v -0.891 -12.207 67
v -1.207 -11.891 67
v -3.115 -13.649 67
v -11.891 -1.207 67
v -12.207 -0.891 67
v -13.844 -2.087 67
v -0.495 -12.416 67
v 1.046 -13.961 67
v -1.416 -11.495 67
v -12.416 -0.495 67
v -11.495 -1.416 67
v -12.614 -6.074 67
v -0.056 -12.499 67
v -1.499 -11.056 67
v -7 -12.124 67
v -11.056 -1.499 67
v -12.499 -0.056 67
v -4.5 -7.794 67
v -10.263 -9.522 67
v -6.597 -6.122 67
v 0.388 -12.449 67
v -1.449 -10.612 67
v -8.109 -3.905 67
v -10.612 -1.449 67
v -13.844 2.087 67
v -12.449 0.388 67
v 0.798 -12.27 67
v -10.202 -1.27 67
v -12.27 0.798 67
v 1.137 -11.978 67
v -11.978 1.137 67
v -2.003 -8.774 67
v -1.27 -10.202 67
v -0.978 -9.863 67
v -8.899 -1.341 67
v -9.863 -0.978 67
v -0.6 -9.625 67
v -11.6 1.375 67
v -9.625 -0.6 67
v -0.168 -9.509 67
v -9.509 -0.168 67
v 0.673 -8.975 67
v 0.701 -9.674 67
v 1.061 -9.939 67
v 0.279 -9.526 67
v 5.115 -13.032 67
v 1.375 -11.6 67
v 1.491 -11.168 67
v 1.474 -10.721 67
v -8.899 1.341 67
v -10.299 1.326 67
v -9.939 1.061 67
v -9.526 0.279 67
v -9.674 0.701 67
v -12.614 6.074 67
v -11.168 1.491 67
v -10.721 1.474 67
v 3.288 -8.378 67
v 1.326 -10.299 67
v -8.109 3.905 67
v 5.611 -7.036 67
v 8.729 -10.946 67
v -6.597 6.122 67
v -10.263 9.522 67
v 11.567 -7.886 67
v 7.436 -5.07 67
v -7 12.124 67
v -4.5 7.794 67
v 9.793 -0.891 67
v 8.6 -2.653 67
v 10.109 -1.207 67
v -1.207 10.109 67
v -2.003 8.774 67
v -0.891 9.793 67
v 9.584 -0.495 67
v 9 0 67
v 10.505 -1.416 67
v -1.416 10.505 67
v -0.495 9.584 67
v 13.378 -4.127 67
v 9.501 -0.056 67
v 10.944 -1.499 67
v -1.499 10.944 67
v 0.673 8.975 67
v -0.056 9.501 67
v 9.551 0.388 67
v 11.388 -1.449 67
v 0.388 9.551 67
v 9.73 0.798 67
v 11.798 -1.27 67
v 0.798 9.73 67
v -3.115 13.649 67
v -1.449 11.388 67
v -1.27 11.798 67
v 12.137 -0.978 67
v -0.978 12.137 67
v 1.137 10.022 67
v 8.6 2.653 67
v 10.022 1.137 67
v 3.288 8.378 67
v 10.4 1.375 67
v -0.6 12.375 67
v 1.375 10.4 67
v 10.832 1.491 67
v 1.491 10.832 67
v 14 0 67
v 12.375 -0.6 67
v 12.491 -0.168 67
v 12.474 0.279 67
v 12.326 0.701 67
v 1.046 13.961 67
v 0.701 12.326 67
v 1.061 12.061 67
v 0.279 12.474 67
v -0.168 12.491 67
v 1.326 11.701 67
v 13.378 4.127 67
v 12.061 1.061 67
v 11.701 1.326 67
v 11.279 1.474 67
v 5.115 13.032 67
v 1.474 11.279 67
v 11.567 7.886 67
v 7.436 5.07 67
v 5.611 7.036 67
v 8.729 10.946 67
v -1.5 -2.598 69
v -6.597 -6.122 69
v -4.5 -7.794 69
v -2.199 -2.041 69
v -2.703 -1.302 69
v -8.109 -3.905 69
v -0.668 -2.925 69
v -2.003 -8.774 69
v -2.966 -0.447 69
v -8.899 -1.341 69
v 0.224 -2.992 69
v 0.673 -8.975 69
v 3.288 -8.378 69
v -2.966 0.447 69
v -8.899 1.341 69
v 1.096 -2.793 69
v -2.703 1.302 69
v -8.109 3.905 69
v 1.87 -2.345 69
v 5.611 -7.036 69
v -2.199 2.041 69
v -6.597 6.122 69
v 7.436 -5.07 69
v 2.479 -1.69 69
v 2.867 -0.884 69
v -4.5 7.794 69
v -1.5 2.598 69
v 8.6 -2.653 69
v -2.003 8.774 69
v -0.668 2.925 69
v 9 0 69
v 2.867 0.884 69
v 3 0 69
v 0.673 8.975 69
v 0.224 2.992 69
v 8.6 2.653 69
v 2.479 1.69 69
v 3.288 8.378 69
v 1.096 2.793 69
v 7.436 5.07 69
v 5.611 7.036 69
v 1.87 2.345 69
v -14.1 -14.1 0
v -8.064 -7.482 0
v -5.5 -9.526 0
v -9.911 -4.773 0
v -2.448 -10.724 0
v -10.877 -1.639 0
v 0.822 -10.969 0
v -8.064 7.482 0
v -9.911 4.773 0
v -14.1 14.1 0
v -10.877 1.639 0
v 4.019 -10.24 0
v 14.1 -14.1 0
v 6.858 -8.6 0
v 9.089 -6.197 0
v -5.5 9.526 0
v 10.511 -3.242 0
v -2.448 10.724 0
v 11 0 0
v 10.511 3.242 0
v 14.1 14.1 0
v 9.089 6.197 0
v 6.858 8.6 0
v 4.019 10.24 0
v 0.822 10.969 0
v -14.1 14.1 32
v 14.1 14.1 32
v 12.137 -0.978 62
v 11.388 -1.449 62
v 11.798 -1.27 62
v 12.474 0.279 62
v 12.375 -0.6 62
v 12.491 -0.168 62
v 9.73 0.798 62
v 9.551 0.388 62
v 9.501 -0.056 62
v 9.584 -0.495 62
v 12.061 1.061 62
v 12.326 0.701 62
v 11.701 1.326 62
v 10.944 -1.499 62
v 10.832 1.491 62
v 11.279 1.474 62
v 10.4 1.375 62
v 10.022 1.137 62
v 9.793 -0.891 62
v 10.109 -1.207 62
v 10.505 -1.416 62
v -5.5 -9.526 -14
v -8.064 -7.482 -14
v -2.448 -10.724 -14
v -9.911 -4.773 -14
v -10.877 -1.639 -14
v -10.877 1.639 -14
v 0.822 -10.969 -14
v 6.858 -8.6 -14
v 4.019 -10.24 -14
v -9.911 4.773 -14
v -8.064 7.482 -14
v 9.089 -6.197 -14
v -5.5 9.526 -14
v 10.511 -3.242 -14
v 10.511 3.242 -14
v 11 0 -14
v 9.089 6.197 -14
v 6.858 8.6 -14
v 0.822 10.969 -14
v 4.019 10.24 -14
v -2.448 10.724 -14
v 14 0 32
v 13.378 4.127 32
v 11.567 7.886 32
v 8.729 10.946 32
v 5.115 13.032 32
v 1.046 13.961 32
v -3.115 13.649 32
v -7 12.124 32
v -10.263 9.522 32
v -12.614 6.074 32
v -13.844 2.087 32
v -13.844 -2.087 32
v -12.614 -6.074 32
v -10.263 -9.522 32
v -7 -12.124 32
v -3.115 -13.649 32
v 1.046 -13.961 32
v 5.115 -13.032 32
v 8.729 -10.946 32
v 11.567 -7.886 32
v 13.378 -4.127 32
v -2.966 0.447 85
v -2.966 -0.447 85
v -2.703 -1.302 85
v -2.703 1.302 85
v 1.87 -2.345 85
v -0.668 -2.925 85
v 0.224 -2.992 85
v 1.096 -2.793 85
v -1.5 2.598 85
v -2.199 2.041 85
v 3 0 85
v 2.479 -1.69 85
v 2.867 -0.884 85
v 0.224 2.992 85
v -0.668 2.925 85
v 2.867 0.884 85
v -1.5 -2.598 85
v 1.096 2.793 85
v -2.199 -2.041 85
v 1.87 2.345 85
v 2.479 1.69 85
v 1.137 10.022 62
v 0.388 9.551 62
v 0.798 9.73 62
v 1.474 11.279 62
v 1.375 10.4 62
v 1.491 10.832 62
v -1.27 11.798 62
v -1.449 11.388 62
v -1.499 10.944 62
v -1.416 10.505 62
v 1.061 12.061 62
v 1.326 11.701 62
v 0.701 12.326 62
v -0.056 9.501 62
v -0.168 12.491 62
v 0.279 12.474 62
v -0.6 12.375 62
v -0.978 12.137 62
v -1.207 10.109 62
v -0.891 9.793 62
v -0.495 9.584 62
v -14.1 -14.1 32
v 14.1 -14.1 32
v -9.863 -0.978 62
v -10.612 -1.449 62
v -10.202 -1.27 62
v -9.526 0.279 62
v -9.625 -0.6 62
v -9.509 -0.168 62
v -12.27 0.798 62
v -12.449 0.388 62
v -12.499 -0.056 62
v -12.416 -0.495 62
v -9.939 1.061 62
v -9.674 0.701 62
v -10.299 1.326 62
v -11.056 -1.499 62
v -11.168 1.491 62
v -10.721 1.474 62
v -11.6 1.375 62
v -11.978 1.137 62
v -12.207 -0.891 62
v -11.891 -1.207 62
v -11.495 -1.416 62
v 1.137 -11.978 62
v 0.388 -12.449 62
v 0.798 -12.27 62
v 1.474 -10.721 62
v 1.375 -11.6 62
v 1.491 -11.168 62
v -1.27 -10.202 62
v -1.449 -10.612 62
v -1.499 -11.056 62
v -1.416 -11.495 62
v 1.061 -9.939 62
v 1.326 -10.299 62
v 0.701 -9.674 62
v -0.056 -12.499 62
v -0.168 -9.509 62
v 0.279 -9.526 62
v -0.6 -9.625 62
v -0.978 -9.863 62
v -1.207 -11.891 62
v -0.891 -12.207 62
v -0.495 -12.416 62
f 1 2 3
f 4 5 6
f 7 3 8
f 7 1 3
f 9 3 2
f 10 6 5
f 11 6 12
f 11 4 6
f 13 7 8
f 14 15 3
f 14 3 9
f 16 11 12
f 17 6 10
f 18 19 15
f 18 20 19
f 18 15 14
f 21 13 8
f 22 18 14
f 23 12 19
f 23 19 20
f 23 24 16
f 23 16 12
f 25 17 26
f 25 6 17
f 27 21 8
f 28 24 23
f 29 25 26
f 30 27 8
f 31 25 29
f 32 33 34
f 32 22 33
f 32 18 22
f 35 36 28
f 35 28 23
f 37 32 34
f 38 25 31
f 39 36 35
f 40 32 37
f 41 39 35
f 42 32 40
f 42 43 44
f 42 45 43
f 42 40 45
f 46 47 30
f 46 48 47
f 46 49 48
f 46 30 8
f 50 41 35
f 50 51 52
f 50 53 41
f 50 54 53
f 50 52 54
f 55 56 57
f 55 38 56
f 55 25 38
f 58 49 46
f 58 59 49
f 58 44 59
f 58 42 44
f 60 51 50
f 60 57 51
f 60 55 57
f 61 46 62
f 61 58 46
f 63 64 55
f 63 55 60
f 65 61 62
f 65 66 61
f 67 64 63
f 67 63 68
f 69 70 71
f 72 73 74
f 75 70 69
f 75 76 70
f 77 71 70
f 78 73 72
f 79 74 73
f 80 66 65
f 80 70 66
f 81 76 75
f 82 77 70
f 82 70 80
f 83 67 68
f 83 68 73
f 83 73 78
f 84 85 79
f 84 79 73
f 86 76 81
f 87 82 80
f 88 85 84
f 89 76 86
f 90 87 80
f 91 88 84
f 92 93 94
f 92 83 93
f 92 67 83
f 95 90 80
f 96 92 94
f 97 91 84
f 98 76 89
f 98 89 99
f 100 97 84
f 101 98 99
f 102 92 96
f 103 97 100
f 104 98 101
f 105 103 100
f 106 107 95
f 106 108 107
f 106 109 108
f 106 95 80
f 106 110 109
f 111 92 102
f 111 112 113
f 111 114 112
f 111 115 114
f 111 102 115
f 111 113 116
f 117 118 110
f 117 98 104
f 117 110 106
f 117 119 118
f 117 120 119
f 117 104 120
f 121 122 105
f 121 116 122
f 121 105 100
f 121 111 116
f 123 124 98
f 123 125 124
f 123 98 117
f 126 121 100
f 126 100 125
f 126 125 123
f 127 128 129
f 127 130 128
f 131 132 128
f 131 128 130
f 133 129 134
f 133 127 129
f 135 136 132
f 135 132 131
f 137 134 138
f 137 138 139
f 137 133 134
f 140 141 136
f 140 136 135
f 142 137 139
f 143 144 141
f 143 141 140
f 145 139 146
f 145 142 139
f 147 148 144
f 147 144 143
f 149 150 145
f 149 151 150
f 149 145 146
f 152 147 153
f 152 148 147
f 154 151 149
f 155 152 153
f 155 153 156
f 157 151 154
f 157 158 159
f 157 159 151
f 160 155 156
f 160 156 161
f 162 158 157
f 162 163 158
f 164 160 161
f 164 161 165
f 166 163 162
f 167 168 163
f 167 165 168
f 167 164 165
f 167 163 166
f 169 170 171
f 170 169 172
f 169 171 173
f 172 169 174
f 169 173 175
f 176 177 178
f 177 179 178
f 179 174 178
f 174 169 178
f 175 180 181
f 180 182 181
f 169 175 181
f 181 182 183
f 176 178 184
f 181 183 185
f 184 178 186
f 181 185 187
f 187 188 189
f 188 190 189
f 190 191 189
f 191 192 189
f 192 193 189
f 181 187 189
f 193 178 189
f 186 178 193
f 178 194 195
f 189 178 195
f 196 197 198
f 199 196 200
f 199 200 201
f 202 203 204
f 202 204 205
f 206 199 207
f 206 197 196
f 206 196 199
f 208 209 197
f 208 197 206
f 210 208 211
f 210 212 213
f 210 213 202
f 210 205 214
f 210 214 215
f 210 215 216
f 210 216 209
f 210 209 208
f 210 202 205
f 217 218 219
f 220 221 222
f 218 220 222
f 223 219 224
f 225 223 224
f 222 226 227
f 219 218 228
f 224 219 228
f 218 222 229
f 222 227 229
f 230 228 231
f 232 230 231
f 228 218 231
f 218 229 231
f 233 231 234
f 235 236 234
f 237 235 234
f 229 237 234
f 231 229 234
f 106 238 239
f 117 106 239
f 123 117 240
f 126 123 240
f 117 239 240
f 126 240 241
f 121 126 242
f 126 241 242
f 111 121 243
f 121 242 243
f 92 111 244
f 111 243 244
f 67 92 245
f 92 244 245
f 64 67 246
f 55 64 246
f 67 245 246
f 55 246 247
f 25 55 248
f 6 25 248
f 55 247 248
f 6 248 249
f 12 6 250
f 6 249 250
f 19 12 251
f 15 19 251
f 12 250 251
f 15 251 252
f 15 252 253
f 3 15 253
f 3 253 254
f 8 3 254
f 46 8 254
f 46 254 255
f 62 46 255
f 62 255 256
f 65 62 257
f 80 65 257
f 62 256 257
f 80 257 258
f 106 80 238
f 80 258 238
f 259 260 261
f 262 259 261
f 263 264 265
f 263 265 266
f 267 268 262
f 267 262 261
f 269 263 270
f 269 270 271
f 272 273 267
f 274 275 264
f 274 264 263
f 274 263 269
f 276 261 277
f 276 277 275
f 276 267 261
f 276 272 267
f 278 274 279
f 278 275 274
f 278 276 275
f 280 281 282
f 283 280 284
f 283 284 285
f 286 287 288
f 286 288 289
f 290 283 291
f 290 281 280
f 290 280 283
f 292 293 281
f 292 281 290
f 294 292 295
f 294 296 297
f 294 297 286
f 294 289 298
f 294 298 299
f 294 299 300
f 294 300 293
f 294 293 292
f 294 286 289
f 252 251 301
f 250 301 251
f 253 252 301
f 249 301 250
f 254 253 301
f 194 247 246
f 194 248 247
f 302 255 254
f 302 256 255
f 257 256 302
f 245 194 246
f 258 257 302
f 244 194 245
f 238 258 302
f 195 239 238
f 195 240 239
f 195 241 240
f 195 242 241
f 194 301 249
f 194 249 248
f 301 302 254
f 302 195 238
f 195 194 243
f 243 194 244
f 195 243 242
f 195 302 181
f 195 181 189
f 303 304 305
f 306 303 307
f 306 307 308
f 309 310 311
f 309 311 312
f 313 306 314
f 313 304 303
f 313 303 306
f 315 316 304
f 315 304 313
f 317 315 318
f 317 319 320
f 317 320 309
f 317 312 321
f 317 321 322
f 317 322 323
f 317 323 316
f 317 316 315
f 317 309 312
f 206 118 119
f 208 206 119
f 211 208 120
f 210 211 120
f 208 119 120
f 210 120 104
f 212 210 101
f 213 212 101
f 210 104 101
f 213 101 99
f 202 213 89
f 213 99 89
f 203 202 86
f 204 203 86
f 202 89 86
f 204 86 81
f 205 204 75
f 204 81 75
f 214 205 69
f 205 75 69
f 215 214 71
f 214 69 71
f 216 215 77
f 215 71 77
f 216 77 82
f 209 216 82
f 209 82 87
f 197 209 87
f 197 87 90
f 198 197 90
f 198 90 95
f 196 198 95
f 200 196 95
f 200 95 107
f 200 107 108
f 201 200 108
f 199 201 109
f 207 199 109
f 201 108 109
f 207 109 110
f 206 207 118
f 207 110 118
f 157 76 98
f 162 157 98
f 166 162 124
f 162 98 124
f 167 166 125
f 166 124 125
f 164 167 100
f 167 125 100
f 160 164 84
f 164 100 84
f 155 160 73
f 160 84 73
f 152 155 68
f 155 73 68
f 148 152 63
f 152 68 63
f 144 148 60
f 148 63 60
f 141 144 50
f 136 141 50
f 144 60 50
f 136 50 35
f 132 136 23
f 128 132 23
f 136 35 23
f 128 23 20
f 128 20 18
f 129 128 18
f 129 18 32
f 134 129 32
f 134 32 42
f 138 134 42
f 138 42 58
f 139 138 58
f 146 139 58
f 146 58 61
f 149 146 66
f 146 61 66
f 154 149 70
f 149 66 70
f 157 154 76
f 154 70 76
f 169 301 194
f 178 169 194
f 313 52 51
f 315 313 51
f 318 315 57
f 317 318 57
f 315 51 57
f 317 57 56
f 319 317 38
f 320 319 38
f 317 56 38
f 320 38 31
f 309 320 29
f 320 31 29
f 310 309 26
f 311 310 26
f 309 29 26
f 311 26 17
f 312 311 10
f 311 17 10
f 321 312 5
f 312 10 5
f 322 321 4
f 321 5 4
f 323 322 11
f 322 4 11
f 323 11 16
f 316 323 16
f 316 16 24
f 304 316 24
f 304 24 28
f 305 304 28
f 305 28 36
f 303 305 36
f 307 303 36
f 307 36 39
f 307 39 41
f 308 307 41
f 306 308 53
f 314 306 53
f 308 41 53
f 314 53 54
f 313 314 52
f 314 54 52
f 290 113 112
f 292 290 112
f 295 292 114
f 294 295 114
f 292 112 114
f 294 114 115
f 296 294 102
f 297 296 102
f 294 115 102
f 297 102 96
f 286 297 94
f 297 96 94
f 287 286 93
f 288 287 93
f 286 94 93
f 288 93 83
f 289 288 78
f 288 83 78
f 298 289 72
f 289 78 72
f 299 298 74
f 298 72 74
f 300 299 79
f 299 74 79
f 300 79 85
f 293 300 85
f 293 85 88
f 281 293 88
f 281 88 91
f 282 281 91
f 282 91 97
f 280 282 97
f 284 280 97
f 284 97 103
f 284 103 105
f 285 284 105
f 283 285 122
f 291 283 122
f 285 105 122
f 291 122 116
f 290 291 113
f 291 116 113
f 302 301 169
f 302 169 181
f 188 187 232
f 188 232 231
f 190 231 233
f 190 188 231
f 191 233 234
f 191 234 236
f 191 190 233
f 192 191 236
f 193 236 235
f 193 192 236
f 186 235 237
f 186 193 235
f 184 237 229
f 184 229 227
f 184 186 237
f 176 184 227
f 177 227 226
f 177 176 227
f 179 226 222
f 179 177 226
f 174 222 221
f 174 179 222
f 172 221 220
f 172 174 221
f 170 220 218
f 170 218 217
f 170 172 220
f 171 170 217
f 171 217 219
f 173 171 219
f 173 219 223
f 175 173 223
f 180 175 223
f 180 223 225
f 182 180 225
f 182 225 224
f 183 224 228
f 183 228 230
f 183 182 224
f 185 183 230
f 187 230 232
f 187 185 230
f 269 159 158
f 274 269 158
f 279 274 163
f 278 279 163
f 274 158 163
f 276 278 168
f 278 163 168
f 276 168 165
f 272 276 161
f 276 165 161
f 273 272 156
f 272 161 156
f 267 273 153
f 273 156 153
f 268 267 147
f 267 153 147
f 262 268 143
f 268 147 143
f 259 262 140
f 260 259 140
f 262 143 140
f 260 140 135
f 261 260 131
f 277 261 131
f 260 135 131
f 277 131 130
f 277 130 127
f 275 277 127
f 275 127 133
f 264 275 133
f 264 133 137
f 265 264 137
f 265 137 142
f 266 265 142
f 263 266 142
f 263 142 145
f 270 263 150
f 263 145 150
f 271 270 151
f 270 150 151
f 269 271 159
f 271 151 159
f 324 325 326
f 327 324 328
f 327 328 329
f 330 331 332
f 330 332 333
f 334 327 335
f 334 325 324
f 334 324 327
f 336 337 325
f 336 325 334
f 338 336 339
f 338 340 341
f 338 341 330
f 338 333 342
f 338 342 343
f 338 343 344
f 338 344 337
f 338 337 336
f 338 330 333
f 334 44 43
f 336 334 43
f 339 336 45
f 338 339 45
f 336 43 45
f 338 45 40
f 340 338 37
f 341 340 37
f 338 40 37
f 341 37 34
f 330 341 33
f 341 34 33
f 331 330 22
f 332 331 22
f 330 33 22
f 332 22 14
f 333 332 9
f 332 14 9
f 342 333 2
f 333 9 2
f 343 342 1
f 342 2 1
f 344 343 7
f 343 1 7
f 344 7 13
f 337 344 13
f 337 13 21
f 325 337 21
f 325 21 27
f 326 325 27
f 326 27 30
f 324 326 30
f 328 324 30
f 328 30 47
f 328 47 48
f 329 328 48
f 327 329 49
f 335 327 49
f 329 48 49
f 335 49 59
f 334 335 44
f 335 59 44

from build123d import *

# Parameters (mm, degrees)
SKETCH_W     = 28.2
SKETCH_H     = 28.2
PAD_DEPTH    = 32
SKETCH002_R  = 14
PAD001_DEPTH = 35
SKETCH003_R  = 9
PAD002_DEPTH = 2
SKETCH004_R  = 3
PAD003_DEPTH = 16
SKETCH005_R  = 11
PAD004_DEPTH = 14
SKETCH006_R  = 1.5
POCKET_DEPTH = 5


with BuildPart() as part:
    # Sketch → Pad (new body)
    with BuildSketch(Plane.XY):
        Rectangle(SKETCH_W, SKETCH_H)
    extrude(amount=PAD_DEPTH)

    # Sketch002 → Pad001 (join)
    with BuildSketch(Plane.XY.offset(32)):
        Circle(SKETCH002_R)
    extrude(amount=PAD001_DEPTH)

    # Sketch003 → Pad002 (join)
    with BuildSketch(Plane.XY.offset(67)):
        Circle(SKETCH003_R)
    extrude(amount=PAD002_DEPTH)

    # Sketch004 → Pad003 (join)
    with BuildSketch(Plane.XY.offset(69)):
        Circle(SKETCH004_R)
    extrude(amount=PAD003_DEPTH)

    # Sketch005 → Pad004 (join)
    with BuildSketch(Plane.XY):
        Circle(SKETCH005_R)
    extrude(amount=-PAD004_DEPTH)

    # Sketch006 → Pocket (cut)
    with BuildSketch(Plane(origin=(0, 0, 67), x_dir=(0.707107, 0.707107, 0), z_dir=(0, 0, 1))):
        with Locations((-7.778175, 7.778175)):
            Circle(SKETCH006_R)
        with Locations((7.778175, 7.778175)):
            Circle(SKETCH006_R)
        with Locations((7.778175, -7.778175)):
            Circle(SKETCH006_R)
        with Locations((-7.778175, -7.778175)):
            Circle(SKETCH006_R)
    extrude(amount=-POCKET_DEPTH, mode=Mode.SUBTRACT)


solid = part.part
